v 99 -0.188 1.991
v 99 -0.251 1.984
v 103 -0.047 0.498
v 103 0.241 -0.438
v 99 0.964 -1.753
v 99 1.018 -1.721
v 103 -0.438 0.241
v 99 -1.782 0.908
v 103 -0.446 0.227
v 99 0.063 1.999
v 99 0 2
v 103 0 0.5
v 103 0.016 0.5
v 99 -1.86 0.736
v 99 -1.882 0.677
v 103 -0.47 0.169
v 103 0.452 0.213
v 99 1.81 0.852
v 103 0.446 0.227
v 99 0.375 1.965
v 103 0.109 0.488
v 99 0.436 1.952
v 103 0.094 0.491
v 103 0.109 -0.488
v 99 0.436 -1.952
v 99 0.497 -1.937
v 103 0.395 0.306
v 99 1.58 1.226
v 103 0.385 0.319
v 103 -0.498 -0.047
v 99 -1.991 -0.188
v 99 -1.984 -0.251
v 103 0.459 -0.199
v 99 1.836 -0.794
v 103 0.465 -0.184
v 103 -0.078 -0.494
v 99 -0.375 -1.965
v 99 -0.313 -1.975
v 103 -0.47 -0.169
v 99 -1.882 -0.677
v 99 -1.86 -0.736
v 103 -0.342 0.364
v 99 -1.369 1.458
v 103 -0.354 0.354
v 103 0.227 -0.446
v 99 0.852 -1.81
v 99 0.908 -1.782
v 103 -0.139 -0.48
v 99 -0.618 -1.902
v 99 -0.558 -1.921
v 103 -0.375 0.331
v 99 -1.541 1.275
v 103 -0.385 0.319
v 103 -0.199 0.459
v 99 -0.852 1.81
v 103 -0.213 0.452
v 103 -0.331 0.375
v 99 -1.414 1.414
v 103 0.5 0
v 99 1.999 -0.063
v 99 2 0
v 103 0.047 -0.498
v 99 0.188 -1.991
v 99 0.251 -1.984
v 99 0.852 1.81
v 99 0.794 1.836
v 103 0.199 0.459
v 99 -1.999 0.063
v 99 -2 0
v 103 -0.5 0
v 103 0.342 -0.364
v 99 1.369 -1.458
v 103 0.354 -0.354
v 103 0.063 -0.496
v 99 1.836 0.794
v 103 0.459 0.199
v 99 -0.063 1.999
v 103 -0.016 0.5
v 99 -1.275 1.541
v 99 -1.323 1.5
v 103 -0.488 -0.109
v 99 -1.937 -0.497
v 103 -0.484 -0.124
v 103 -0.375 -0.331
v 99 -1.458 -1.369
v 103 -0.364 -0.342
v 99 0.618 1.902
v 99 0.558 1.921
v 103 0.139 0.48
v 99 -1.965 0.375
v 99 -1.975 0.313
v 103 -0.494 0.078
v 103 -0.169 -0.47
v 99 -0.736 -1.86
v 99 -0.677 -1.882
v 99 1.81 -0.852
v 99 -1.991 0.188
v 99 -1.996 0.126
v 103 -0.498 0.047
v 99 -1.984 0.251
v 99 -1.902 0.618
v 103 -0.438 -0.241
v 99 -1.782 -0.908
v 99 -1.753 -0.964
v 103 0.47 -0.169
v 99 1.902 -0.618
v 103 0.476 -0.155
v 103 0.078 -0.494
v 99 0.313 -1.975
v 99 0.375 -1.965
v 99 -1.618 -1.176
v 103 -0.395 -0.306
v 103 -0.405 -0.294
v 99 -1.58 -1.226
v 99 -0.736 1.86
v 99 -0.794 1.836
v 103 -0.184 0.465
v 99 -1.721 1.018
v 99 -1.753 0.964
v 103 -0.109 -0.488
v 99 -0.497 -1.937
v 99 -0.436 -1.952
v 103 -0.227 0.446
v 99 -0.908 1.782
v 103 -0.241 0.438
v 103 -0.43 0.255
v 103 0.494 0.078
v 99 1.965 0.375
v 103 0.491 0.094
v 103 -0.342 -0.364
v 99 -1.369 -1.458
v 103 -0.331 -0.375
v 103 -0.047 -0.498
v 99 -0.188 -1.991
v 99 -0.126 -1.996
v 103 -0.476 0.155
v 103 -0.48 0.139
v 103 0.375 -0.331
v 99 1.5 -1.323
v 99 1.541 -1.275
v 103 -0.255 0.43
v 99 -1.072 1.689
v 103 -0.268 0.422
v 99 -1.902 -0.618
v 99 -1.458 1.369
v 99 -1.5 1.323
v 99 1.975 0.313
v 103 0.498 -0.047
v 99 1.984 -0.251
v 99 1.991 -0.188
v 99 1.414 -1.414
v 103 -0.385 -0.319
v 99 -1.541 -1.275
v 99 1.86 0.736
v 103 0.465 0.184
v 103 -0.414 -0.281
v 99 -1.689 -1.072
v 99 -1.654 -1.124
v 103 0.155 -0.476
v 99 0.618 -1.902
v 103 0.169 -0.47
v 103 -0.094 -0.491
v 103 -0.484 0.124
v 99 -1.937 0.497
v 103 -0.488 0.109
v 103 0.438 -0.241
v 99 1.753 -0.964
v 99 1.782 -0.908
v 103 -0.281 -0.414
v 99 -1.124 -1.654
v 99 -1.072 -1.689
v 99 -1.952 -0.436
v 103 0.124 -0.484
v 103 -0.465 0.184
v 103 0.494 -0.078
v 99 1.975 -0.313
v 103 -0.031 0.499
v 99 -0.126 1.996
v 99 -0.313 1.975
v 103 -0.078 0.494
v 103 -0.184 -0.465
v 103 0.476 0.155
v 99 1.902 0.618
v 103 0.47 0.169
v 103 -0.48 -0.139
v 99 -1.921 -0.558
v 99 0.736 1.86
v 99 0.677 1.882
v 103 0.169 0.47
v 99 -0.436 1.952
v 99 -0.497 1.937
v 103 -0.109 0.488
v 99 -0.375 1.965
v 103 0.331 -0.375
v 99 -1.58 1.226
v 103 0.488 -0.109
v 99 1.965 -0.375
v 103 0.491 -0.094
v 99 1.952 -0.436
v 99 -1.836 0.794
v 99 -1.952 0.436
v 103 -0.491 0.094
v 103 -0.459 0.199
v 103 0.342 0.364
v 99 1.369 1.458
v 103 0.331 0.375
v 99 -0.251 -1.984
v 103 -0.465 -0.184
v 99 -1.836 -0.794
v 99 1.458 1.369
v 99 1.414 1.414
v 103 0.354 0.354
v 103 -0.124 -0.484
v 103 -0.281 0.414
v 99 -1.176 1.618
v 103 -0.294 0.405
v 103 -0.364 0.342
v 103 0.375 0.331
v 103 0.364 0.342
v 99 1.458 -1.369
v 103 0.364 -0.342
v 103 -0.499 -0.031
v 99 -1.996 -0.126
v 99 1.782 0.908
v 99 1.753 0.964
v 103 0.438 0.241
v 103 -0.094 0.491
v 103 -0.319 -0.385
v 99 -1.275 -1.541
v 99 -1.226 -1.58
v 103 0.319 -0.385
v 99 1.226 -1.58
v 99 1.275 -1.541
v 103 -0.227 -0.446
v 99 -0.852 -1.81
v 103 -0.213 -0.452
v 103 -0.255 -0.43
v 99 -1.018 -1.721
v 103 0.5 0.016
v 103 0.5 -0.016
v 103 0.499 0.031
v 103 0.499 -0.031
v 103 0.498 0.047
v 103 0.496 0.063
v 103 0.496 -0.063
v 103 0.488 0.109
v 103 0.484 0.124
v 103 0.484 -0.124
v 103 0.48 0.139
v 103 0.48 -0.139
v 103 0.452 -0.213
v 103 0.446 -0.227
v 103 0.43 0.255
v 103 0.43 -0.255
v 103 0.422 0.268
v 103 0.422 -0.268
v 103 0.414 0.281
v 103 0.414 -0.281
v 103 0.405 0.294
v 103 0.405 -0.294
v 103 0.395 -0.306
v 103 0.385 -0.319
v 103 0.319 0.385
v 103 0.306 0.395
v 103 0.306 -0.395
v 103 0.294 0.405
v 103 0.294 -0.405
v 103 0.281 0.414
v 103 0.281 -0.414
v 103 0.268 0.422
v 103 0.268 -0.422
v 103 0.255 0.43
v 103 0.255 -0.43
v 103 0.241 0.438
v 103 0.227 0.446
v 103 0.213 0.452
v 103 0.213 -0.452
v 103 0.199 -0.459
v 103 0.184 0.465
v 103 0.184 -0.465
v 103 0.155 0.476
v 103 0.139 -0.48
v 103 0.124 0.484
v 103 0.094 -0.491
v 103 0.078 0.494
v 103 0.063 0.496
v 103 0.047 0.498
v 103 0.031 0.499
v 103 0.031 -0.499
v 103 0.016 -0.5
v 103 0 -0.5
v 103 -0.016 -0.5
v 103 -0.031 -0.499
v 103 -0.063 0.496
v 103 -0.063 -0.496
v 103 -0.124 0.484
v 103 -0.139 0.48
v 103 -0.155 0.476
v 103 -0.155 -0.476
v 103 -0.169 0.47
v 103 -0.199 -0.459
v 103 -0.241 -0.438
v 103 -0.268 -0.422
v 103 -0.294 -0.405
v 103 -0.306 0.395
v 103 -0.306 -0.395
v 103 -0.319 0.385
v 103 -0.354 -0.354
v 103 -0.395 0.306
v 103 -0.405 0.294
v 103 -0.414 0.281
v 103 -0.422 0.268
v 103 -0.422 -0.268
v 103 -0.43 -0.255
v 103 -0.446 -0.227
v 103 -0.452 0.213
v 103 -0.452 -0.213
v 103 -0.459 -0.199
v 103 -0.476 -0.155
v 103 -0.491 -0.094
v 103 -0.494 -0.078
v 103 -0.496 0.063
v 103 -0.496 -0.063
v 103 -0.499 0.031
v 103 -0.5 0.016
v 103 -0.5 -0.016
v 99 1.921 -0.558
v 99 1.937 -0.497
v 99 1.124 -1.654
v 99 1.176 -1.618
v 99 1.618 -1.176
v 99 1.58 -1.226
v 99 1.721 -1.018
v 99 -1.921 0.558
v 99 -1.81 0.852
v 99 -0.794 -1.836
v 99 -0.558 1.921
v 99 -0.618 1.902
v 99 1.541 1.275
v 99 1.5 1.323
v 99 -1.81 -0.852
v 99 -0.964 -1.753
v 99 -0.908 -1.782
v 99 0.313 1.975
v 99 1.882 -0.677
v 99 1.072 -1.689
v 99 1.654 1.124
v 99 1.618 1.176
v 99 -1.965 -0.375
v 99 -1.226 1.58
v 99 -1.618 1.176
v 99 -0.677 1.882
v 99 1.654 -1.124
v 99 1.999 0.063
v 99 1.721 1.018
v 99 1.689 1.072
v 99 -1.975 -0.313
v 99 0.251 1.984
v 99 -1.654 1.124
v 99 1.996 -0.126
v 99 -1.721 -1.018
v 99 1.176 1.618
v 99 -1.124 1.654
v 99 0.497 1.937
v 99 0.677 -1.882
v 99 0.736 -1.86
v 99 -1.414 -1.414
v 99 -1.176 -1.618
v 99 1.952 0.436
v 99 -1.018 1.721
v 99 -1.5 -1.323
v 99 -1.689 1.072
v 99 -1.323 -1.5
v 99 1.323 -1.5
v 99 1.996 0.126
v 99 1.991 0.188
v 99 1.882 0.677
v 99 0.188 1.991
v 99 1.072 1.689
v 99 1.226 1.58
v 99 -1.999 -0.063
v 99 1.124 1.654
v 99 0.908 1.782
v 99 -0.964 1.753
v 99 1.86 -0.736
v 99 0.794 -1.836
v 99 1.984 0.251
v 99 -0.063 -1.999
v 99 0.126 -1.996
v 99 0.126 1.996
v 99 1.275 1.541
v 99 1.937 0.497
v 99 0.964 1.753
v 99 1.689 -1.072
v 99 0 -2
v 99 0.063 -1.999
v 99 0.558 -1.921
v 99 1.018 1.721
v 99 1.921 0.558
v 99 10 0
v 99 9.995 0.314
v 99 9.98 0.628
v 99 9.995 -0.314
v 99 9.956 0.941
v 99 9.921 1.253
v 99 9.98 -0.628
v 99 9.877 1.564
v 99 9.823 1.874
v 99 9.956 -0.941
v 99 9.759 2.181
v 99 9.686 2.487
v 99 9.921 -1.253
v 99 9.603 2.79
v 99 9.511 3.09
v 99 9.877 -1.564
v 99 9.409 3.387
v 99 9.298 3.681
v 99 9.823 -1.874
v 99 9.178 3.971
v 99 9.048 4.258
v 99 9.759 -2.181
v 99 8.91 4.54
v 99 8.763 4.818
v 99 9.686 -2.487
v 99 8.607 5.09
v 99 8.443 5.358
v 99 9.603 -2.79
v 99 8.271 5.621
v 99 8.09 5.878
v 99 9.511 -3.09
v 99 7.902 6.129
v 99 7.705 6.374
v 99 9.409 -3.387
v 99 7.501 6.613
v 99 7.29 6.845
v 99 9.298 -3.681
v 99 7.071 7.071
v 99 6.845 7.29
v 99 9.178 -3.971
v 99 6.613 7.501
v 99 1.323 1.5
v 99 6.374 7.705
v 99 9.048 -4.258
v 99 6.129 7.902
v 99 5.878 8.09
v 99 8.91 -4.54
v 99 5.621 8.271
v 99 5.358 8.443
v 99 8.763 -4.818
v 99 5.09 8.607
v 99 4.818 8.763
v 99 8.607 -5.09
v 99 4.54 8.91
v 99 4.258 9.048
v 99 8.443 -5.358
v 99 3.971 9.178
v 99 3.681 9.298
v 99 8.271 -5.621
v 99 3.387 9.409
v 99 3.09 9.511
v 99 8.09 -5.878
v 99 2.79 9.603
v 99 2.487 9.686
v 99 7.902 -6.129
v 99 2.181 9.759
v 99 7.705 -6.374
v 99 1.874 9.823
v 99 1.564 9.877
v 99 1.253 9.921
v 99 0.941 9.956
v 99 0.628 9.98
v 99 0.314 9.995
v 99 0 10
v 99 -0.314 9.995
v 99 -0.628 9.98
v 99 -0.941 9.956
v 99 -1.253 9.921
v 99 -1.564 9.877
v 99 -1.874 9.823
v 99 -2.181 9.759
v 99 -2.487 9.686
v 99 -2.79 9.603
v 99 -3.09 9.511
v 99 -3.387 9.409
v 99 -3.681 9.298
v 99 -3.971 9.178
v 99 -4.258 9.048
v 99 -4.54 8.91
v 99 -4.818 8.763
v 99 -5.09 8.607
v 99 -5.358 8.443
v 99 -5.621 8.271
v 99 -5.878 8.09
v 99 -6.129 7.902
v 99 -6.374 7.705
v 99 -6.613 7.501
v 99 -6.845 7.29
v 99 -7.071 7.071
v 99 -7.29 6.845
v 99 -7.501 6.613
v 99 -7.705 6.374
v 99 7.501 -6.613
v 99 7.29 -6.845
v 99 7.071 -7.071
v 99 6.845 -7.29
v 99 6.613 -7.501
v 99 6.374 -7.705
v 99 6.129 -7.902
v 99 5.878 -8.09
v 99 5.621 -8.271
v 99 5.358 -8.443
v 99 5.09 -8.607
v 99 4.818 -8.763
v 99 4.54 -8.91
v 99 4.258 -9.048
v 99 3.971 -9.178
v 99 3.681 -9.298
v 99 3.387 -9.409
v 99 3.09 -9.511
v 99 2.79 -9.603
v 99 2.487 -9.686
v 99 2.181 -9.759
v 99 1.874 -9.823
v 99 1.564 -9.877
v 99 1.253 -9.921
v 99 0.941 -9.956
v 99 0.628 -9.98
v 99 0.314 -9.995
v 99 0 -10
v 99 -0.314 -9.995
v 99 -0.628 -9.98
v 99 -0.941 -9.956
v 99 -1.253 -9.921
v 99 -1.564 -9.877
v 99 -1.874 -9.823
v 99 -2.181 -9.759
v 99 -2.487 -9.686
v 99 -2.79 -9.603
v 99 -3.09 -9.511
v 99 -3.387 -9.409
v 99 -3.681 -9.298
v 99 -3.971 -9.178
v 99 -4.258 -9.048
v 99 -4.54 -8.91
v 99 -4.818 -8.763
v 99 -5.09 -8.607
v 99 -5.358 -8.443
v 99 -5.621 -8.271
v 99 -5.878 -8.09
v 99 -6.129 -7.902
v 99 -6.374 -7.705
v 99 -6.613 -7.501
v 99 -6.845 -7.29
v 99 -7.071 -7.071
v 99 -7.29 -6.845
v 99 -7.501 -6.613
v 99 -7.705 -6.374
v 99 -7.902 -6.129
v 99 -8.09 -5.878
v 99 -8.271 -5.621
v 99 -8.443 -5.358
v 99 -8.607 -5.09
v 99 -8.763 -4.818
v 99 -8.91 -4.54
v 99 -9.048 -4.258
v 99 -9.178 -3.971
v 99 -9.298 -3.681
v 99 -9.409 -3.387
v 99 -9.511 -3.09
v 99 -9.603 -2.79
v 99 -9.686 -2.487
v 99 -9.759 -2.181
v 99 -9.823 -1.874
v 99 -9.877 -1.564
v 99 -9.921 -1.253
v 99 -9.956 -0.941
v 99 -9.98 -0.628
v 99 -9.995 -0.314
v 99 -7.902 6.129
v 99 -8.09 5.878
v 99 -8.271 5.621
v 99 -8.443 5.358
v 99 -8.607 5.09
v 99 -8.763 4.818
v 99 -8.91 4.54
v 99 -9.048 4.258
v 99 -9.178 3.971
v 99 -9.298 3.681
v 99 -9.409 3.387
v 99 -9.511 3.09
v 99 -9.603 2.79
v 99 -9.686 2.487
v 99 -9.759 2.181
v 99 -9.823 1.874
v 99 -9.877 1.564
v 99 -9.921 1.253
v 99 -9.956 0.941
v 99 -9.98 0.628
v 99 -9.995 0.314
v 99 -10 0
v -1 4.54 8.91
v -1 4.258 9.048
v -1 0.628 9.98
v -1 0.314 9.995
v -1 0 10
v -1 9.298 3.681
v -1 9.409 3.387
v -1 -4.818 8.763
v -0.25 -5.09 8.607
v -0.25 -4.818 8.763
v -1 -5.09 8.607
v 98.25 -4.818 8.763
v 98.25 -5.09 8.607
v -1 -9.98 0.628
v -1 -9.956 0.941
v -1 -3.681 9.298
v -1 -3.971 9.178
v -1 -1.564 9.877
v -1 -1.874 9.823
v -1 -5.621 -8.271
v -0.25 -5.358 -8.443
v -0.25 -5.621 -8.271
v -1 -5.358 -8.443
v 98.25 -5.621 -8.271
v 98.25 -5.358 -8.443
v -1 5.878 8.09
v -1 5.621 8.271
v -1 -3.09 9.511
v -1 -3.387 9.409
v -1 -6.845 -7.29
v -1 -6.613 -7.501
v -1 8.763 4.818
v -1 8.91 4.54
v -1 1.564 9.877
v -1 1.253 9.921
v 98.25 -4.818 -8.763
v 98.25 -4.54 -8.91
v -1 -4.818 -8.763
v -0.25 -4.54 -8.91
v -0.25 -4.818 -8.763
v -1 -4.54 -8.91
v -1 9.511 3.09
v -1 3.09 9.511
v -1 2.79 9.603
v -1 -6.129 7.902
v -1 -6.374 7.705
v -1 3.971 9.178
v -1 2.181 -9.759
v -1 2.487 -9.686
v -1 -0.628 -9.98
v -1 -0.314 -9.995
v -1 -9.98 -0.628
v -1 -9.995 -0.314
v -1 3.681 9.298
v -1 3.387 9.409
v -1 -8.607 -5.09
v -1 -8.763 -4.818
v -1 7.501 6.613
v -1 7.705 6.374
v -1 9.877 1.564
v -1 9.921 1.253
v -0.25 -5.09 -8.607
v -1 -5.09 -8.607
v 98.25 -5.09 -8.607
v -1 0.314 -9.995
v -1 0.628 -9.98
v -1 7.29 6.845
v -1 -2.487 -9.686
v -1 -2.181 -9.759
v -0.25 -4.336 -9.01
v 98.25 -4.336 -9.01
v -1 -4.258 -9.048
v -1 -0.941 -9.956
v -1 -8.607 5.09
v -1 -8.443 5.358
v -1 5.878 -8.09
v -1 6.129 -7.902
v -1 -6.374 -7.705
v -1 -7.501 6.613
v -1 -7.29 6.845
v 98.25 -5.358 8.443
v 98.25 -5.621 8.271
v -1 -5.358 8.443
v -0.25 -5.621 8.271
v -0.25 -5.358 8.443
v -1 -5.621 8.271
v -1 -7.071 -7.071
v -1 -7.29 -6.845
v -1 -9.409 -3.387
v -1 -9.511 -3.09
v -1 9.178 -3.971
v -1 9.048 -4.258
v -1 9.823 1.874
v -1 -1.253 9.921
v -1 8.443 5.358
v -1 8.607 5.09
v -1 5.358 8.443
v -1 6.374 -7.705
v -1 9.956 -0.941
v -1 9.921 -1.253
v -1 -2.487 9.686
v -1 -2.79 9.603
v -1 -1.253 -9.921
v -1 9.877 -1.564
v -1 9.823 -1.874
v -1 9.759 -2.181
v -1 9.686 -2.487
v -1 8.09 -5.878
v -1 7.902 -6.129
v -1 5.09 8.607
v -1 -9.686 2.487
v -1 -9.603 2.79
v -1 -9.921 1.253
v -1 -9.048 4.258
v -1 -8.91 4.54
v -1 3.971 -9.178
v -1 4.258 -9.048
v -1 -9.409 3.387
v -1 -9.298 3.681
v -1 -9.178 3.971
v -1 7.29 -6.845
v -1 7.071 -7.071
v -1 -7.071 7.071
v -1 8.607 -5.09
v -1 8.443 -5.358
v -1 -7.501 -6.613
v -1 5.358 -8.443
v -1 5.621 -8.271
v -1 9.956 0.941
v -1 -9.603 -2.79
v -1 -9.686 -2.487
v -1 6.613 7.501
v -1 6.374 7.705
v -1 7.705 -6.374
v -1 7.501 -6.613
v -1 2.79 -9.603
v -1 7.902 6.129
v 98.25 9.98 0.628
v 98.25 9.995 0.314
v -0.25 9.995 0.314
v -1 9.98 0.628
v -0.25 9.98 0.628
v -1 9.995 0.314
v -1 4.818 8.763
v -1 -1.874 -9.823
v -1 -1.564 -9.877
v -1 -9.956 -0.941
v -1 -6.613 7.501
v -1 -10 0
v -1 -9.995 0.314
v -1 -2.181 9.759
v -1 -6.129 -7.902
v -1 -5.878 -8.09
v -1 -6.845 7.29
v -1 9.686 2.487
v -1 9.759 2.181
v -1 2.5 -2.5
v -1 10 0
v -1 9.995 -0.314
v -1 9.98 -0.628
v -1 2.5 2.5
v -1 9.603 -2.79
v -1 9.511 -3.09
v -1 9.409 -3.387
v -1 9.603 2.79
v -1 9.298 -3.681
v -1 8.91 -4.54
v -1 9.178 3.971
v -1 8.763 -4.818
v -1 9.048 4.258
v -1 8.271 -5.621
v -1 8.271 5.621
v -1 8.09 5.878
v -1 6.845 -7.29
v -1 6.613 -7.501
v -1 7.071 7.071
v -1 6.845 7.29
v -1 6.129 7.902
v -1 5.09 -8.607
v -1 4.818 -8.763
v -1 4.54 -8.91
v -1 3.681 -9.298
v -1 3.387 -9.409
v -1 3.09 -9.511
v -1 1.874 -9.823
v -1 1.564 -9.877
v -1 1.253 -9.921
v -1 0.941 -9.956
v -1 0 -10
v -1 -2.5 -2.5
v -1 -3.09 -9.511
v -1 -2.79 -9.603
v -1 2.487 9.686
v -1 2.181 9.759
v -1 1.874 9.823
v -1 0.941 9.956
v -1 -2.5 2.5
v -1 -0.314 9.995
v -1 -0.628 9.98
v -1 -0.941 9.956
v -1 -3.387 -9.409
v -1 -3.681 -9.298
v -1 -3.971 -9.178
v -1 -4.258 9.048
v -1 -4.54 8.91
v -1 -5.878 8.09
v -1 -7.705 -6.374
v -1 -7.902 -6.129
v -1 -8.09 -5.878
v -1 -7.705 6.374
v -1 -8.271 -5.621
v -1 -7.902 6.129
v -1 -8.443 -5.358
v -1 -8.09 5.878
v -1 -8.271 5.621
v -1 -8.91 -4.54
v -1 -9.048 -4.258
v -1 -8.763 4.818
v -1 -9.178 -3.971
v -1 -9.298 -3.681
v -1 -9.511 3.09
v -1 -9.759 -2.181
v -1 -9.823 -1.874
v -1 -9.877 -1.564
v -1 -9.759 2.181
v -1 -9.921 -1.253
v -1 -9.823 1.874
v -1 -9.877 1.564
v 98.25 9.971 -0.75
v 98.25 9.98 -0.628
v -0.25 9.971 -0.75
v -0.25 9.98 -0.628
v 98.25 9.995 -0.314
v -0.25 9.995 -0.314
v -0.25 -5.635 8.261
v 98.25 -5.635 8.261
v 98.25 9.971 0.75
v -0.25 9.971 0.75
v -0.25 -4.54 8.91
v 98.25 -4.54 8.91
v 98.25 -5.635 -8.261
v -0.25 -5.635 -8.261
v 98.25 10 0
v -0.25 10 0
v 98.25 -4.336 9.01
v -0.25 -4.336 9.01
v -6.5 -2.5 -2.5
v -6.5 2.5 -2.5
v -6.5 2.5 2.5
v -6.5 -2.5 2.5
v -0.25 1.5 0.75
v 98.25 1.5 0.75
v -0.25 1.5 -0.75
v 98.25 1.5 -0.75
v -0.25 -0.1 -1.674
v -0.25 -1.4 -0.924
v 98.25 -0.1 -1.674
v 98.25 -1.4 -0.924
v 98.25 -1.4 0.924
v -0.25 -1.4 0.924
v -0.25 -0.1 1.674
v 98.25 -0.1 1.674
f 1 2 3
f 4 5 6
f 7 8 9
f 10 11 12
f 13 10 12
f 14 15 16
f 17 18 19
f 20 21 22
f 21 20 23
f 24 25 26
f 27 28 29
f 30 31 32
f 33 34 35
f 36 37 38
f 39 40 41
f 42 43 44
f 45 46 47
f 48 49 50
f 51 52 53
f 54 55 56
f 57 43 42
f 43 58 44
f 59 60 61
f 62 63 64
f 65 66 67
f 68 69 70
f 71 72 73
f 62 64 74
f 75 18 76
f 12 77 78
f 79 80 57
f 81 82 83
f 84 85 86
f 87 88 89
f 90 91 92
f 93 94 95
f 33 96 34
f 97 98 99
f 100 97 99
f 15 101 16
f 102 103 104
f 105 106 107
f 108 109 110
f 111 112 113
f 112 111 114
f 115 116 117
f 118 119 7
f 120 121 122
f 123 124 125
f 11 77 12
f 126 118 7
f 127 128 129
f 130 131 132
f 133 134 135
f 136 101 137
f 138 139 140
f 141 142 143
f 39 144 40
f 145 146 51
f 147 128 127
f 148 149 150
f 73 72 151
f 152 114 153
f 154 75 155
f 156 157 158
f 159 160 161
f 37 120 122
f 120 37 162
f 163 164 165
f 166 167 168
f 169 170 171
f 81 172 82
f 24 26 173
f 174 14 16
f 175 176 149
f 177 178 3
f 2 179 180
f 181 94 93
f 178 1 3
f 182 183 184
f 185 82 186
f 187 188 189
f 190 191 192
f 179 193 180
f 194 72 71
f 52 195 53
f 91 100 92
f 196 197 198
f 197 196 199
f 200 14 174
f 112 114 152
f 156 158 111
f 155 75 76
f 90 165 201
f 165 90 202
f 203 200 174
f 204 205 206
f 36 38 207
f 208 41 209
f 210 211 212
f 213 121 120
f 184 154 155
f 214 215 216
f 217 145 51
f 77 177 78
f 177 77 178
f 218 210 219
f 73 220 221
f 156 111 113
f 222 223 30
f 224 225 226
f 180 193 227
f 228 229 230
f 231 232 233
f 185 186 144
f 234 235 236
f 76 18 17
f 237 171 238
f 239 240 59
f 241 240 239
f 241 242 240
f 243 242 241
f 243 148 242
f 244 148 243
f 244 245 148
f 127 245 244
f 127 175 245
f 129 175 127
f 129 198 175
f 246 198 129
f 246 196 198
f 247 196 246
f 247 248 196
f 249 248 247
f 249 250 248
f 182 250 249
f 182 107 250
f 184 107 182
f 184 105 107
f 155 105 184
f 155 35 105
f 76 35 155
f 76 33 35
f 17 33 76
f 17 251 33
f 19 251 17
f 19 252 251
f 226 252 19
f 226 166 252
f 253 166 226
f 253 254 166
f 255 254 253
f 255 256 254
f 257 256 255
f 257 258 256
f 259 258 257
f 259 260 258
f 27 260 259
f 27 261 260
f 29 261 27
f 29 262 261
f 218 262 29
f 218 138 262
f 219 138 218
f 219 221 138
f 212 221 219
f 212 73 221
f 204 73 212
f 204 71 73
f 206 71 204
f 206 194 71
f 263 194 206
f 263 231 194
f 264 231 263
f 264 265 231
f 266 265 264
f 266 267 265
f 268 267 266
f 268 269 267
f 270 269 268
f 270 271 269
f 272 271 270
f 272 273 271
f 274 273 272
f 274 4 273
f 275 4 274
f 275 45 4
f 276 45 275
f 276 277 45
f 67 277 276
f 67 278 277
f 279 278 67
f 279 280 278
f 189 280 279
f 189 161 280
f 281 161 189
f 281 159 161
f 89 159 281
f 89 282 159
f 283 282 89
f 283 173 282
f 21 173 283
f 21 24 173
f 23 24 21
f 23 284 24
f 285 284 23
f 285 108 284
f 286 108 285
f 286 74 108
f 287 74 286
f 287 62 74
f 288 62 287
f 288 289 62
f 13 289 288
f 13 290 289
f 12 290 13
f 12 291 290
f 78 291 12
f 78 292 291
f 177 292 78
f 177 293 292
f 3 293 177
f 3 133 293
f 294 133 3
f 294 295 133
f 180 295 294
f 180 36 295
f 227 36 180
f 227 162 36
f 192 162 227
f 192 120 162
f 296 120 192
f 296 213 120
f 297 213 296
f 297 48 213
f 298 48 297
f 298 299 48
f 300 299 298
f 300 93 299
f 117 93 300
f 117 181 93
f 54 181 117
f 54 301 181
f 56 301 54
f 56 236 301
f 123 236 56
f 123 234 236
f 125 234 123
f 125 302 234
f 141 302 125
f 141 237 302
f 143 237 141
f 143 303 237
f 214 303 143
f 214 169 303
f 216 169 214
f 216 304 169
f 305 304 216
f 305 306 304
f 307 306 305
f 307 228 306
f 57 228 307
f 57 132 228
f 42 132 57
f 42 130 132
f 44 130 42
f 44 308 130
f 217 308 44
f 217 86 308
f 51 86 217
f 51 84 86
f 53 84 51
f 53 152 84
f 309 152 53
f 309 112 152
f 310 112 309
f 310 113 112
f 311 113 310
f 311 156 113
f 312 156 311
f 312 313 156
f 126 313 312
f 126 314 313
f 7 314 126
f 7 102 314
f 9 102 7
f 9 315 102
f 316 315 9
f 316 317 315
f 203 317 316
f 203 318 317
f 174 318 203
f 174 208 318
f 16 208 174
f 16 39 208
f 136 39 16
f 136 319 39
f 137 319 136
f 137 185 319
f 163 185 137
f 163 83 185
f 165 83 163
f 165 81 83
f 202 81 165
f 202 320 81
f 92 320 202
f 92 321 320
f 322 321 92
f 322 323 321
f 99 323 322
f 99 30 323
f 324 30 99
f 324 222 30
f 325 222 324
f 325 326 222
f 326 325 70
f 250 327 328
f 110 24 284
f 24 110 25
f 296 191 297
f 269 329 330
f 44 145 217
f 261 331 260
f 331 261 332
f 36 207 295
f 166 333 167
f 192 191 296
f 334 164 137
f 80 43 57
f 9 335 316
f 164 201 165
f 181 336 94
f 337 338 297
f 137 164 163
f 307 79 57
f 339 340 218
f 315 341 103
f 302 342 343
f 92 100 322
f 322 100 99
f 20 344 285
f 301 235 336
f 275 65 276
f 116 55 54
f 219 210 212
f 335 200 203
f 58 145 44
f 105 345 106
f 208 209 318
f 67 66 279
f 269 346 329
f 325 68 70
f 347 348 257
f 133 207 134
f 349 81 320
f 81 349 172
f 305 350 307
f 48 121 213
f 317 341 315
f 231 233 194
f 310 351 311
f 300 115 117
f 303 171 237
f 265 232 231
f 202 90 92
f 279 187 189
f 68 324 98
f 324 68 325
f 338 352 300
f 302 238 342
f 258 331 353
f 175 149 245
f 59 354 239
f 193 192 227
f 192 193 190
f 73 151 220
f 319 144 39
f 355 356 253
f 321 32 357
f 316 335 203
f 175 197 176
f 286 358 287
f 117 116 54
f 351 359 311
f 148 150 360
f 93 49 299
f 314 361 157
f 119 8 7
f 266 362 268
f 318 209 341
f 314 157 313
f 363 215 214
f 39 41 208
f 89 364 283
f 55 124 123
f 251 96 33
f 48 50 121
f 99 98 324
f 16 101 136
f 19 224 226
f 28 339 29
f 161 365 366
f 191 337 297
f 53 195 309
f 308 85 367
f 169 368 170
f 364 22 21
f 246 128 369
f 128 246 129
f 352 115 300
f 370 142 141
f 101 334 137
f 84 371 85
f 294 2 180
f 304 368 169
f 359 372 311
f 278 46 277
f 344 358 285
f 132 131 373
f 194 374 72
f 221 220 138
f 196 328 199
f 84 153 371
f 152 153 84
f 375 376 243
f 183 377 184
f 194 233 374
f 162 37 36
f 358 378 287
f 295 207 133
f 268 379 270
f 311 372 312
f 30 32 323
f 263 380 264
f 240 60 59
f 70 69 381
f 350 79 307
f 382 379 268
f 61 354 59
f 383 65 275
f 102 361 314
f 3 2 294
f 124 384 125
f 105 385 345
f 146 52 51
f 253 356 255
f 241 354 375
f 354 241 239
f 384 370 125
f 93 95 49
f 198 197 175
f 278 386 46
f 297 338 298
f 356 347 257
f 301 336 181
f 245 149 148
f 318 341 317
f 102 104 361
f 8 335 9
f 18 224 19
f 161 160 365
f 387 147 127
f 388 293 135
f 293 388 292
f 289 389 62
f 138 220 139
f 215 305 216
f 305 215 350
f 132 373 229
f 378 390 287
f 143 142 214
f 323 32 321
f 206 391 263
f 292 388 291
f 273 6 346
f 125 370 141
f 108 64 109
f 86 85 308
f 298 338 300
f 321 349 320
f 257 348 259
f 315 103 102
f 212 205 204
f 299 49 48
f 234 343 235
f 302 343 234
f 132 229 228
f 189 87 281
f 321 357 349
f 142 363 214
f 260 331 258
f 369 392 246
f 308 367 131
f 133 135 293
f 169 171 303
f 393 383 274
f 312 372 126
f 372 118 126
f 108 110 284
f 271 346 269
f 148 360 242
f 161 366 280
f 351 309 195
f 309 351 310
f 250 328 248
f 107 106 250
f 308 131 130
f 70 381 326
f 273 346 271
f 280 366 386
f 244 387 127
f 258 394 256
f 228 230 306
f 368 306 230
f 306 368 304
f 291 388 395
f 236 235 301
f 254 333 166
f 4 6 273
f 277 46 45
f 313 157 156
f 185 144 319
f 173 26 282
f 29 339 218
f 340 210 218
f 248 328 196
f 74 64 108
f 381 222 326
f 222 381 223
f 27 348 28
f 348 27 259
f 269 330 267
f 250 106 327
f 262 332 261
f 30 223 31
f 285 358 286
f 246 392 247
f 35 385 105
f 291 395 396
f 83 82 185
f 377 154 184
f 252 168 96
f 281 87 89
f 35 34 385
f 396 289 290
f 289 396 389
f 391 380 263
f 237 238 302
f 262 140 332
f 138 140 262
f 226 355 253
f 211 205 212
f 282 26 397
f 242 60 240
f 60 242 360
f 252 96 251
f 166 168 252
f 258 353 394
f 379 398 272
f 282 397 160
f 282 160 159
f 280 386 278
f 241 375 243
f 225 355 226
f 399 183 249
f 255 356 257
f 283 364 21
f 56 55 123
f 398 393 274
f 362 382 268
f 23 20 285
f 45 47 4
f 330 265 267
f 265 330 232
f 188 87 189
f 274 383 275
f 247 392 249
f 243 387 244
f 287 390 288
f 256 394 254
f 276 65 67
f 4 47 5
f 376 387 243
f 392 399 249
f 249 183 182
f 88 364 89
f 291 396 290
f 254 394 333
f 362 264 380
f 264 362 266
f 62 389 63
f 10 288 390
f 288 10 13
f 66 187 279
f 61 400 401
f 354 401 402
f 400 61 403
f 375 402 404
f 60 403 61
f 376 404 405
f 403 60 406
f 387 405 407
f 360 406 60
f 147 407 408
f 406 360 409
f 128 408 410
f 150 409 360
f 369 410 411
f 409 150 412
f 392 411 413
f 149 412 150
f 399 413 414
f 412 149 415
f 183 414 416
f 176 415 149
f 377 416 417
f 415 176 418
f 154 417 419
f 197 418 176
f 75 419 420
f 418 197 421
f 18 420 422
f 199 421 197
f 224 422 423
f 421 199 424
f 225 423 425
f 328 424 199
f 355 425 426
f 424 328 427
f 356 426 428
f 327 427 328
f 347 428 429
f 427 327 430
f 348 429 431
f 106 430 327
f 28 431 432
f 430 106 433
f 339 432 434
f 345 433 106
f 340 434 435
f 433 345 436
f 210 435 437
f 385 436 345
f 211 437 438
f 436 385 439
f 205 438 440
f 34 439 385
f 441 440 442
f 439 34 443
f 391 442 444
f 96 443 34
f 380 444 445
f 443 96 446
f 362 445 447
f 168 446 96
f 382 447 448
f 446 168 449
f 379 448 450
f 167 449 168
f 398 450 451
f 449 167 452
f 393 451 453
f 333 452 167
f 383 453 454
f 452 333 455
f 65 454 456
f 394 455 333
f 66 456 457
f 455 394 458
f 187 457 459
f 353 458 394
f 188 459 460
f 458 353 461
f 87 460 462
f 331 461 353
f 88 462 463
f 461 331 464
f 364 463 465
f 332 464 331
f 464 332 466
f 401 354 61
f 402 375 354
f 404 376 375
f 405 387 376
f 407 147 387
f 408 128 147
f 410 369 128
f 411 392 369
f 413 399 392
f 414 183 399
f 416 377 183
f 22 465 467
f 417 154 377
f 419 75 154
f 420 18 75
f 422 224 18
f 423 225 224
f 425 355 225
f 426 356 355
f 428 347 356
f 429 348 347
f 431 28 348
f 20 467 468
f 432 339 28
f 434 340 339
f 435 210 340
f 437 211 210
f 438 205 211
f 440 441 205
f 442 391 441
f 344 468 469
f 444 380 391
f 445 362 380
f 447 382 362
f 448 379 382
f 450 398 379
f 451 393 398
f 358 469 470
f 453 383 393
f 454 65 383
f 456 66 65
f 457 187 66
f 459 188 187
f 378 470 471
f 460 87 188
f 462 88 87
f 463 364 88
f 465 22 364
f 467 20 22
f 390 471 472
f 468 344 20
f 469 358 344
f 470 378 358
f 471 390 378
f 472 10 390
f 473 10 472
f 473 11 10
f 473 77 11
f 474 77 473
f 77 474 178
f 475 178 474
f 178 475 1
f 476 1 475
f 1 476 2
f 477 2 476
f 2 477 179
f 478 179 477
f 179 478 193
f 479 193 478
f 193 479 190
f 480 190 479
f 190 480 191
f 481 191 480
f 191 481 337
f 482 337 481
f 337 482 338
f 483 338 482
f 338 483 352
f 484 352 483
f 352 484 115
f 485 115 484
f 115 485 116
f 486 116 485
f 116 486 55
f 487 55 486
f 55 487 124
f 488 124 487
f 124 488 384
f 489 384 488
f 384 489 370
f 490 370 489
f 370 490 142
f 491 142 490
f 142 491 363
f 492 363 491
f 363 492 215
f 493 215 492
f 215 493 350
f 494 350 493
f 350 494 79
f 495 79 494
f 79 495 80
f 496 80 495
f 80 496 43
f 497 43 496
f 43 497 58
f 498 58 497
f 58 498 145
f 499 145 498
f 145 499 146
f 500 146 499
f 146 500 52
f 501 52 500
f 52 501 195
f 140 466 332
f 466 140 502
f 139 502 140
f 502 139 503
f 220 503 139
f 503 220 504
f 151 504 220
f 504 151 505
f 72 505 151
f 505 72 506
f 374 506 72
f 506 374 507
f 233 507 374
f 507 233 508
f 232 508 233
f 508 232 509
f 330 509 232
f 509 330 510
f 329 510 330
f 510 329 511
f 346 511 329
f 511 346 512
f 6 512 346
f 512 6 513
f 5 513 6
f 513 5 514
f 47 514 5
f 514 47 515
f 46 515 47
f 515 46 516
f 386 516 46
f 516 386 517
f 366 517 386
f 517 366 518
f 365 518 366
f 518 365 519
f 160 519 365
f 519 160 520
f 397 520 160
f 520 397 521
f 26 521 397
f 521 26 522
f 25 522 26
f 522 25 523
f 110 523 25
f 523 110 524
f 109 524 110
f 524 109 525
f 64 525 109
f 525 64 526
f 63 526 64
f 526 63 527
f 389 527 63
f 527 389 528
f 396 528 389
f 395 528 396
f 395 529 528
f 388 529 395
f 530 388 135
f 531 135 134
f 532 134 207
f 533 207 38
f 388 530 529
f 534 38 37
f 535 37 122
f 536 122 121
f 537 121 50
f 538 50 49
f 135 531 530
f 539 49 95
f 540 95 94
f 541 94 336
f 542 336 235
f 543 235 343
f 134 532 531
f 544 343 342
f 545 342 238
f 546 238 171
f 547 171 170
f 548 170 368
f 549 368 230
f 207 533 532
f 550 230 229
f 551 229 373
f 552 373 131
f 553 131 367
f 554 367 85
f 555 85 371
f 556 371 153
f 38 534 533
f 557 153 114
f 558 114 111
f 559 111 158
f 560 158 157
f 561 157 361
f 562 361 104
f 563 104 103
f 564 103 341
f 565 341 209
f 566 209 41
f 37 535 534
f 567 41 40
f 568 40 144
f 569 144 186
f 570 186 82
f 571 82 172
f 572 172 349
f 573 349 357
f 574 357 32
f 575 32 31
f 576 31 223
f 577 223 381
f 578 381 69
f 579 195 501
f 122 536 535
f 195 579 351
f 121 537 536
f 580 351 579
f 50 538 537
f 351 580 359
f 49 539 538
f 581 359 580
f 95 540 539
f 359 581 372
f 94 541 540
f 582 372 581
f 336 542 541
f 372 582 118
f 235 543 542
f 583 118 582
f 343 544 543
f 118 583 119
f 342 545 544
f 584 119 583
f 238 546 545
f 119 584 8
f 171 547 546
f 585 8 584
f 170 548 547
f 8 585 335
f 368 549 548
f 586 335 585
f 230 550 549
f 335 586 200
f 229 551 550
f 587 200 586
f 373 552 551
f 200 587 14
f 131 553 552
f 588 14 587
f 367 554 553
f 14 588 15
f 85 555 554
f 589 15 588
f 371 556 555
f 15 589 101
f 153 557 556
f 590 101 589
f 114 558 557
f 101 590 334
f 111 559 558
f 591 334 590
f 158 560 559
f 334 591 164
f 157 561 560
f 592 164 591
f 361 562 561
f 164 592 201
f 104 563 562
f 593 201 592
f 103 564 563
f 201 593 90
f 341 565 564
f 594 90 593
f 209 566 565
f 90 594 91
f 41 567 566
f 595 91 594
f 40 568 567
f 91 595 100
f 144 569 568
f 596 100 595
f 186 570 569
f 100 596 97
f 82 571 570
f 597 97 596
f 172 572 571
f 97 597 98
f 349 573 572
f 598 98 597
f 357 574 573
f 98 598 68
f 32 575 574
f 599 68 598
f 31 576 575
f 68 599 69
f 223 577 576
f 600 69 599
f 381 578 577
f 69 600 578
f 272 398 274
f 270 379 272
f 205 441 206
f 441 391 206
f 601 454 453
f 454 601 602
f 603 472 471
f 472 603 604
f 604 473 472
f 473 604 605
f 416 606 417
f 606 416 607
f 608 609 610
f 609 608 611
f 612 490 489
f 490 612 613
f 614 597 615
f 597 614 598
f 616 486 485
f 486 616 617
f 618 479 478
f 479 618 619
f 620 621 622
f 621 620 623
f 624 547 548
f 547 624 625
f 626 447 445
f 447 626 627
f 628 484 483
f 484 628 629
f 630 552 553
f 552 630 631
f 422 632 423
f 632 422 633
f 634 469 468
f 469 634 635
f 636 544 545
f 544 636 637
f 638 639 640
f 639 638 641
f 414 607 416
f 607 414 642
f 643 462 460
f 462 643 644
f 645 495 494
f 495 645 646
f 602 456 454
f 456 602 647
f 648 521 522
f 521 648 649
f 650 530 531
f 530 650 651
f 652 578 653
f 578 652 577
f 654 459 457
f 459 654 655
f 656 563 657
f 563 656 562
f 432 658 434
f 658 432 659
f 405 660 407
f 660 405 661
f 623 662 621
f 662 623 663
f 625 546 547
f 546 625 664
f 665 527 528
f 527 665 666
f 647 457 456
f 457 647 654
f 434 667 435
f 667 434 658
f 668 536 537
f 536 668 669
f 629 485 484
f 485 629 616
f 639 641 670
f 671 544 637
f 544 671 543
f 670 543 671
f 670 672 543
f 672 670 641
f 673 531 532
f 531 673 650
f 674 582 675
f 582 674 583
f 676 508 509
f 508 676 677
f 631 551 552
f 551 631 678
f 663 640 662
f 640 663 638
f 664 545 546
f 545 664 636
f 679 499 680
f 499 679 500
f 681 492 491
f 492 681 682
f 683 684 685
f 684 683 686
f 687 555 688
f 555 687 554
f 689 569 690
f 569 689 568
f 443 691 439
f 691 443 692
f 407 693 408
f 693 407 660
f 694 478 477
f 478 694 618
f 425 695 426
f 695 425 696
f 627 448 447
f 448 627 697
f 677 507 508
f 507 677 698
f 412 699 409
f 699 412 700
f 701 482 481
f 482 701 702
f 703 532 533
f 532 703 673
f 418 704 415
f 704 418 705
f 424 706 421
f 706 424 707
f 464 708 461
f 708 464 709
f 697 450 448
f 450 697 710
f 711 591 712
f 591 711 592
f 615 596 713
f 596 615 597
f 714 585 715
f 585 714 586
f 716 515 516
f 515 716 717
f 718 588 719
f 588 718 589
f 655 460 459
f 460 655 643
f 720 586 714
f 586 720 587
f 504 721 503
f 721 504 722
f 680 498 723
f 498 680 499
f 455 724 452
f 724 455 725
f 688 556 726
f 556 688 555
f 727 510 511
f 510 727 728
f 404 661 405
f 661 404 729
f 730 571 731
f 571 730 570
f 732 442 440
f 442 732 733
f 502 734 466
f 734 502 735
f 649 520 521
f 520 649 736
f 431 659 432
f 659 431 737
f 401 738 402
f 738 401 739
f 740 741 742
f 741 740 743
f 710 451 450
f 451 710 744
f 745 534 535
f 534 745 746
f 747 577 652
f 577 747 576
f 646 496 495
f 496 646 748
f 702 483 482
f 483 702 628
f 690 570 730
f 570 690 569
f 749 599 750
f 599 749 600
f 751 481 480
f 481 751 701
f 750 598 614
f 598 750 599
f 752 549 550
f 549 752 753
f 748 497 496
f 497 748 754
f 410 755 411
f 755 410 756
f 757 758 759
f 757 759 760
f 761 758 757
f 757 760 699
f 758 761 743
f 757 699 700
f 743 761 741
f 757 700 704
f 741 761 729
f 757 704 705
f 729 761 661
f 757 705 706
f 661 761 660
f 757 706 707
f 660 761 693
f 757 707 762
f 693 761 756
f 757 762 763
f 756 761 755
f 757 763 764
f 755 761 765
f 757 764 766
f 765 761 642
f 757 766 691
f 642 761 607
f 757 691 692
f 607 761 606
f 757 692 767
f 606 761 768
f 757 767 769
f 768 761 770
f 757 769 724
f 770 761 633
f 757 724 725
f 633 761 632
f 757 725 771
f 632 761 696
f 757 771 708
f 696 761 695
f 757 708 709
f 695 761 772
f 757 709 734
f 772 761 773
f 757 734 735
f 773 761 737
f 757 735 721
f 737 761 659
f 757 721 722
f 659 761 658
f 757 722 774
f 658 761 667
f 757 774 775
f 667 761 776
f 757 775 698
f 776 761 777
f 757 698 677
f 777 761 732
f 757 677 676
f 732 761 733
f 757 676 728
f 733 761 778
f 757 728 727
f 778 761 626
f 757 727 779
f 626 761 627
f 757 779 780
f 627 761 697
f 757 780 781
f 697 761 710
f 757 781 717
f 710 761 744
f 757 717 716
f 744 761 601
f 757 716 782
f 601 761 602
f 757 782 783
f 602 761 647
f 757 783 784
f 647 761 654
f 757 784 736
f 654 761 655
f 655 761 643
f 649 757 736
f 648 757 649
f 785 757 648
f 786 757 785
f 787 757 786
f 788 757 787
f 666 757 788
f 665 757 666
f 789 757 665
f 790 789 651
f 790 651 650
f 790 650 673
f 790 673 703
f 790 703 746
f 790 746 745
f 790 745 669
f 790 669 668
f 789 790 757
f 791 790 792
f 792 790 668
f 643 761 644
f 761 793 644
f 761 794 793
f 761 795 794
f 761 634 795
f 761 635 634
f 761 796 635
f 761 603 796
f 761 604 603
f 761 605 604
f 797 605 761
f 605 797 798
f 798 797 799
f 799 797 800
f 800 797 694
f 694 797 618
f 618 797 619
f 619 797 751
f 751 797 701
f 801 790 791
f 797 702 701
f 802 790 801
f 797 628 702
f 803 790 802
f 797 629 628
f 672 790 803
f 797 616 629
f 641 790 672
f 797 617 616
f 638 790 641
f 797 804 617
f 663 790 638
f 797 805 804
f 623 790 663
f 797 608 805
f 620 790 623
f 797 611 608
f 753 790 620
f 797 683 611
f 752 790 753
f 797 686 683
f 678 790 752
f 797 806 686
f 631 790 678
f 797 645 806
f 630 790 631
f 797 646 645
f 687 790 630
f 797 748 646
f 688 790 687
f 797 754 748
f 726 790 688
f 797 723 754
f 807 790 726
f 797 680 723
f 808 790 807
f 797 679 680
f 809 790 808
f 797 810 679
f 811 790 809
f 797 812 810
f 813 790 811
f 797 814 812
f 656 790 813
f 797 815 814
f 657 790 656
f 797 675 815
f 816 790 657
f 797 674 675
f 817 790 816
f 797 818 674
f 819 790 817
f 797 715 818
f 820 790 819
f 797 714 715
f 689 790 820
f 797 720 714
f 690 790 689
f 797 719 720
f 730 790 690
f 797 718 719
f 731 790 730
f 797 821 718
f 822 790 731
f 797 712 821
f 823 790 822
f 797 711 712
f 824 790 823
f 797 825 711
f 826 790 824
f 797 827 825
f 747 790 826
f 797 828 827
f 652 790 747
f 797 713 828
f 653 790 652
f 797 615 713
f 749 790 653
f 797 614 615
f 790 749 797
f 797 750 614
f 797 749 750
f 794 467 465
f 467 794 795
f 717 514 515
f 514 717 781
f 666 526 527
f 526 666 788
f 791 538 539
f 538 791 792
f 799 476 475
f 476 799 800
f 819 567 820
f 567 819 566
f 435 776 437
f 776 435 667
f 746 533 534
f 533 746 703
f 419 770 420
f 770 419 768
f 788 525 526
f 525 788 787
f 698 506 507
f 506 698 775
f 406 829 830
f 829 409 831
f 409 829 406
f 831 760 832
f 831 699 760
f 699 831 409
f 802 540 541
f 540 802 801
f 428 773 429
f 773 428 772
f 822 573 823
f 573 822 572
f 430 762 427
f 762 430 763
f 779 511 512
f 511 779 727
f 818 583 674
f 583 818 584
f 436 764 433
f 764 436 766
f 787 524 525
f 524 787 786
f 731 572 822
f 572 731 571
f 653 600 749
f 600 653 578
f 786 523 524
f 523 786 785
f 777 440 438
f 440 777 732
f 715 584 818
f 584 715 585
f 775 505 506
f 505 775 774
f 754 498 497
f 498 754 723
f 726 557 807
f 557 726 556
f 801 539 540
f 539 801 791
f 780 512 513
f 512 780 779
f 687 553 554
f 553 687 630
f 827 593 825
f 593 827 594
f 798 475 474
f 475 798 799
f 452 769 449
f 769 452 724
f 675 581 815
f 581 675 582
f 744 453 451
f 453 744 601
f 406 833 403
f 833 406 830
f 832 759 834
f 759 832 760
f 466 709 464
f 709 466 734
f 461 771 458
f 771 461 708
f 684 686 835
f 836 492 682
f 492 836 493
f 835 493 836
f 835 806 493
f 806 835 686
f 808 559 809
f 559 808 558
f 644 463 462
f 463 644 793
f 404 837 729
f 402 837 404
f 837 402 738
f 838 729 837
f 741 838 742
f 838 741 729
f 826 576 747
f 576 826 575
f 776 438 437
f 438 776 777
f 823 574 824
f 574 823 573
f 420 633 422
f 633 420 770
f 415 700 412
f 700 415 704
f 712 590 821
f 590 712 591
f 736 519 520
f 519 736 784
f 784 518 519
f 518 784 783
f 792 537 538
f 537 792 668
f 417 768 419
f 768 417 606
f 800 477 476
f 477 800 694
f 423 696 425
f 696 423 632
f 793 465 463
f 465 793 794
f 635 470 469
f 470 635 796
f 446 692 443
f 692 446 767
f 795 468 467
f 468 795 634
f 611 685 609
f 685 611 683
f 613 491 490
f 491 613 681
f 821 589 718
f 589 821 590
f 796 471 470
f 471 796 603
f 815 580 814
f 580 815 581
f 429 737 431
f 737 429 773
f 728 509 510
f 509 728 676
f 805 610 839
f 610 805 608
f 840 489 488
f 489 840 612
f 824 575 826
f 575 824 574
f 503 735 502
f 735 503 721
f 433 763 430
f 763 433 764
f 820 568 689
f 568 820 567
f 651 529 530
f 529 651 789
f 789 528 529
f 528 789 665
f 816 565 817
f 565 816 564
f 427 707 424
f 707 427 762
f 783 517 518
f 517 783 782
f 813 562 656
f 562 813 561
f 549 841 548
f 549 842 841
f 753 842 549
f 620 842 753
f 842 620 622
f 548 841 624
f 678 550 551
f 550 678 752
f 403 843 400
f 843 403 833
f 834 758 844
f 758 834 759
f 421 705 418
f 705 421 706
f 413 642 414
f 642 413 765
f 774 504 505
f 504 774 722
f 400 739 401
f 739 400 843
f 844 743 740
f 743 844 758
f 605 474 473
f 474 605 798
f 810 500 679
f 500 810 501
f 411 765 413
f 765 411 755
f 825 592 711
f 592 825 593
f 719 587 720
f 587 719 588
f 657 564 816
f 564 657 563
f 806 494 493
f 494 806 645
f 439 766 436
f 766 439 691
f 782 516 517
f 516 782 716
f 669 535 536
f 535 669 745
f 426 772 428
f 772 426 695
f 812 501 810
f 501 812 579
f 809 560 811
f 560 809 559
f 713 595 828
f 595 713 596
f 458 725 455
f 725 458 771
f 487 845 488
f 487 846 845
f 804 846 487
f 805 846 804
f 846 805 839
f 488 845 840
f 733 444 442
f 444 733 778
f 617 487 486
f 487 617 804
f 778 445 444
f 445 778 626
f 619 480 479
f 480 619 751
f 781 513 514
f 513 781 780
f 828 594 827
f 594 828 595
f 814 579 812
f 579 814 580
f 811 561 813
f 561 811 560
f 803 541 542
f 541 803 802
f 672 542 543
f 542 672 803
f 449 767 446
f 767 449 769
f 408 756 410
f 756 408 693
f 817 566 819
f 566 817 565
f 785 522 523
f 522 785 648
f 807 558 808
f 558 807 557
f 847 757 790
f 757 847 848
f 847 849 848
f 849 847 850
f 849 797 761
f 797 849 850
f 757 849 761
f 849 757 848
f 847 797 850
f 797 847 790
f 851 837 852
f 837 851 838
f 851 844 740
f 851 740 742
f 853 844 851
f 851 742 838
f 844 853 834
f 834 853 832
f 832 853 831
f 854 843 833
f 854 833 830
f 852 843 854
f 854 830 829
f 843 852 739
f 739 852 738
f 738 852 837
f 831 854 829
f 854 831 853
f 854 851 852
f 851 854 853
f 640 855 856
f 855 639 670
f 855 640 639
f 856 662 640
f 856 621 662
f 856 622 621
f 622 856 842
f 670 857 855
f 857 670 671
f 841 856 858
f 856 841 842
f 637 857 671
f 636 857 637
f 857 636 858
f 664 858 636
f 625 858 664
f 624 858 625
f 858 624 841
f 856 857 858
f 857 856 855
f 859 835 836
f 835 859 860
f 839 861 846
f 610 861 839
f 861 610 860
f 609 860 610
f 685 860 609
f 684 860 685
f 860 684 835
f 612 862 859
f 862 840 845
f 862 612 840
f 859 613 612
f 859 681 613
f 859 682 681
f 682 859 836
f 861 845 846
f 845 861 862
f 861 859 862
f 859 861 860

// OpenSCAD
// Generated by SolidPython 1.1.3 on 2022-07-08 02:15:18
$fn=200;


difference(){
	union() {
		translate(v = [101.0000000000, 0, 0]) {
			rotate(a = [0, -90, 0]) {
				union() {
					cylinder(center = true, h = 4.0000000000, r1 = 0.5000000000, r2 = 2.0000000000);
					translate(v = [0, 0, 52.0000000000]) {
						difference() {
							cylinder(center = true, h = 100.0000000000, r = 10.0000000000);
						}
					}
				}
			}
		}
		translate(v = [-2.5000000000, 0, 0]) {
			rotate(a = [0, 90, 0]) {
				cube(center = true, size = [5.0000000000, 5.0000000000, 8.0000000000]);
			}
		}
	}
	/* Holes Below*/
	union(){
		translate(v = [101.0000000000, 0, 0]){
			rotate(a = [0, -90, 0]){
				union(){
					translate(v = [0, 0, 52.0000000000]){
						union(){
							rotate(a = [0, 0, 0.0000000000]) {
								translate(v = [0, 5.7500000000, 0]) {
									cube(center = true, size = [1.5000000000, 8.5000000000, 98.5000000000]);
								}
							}
							rotate(a = [0, 0, 120.0000000000]) {
								translate(v = [0, 5.7500000000, 0]) {
									cube(center = true, size = [1.5000000000, 8.5000000000, 98.5000000000]);
								}
							}
							rotate(a = [0, 0, 240.0000000000]) {
								translate(v = [0, 5.7500000000, 0]) {
									cube(center = true, size = [1.5000000000, 8.5000000000, 98.5000000000]);
								}
							}
						}
					}
				}
			}
		}
	} /* End Holes */ 
}
/***********************************************
*********      SolidPython code:      **********
************************************************
 
from solid import *
from solid.utils import *
from math import asin, atan, pi, cos, sin, sqrt, tan, acos
import toml
import os


'''
a roomba brush for inserting nylon fibers into and zip tying 
together to form a disposable roomba brush. get an old broom and place tape across then cut.
place a belt of fibers into the wedge segments on either side, insert each wedge segment into the brush and zip tie.
insert the belt of fibers into the roomba brush

TODO: snap on to remove the need for zip ties
TODO: Can insert razors 
to chop hair that gets wound around the brush.
'''
def RoombaBrush(
    motor_insert_cube_profile,
    motor_insert_cube_length,
    stator_insert_cube_profile,
    stator_insert_cube_length,
    brush_length,
    brush_diameter,
    number_fins,
    fiber_diameter,
    wall_thickness,
):
    roomba_brush = None
    # create the cube for the stator side insert
    # TODO: frustrum cone instead as a bushing
    # stator_insert = cube(
    #     [stator_insert_cube_profile, stator_insert_cube_profile, stator_insert_cube_length], center=True)
    stator_insert = cylinder(
        r1=stator_insert_cube_profile-wall_thickness,
        r2=stator_insert_cube_profile,
        h=stator_insert_cube_length,
        center=True,
    )

    # create the cube for the motor side insert
    motor_insert = cube(
        [motor_insert_cube_profile, motor_insert_cube_profile, motor_insert_cube_length], center=True)

    # create a flange with inserts for each segment of the cylinder brush and attach to motor_insert and stator_insert
    flange = cylinder(
        r=brush_diameter, h=brush_length, center=True)
    # create guides for the fins as wall_thickness cubes 
    fin_guide = cube(
        [wall_thickness, brush_diameter-wall_thickness, brush_length-wall_thickness], center=True)
    fin_guide = translate([0, brush_diameter/2+wall_thickness/2, 0])(fin_guide)


    # calculate the degrees of rotation for each fin
    fin_rotation = 360 / number_fins
    # insert the fins atop the flange
    for i in range(number_fins):
        fin = rotate([0, 0, fin_rotation * i])(fin_guide)
        flange = flange-hole()(fin)
        # flange=flange+fin

    # place the flange on motor and stator inserts
    stator_insert = stator_insert + translate([0, 0, brush_length/2+stator_insert_cube_length/2])(flange)
    motor_insert = motor_insert 
    # rotate the inserts to be parallel to the x-axis
    stator_insert = rotate([0, -90, 0])(stator_insert)
    motor_insert = rotate([0, 90, 0])(motor_insert)
    
    # move the stator to the far side of the brush
    stator_insert = translate([brush_length+stator_insert_cube_profile/2,0,0])(stator_insert)
    # move the motor back to the yz plane
    motor_insert = translate([-motor_insert_cube_profile/2,0,0])(motor_insert)
    # get the degrees due to wall_thickness chord at brush_diameter
    chord_degrees = 360*wall_thickness/(pi*brush_diameter)

    # create a wedge for each segment of the brush that starts as arclength and ends as fiber_diameter
    # stuff fibers on either side and affix with glue or tape, this is temporary as zip ties will 
    # squeeze them against the barrell
    wedge= cube(
        [wall_thickness-2*fiber_diameter, brush_diameter-wall_thickness, brush_length-wall_thickness], center=True)
    wedge= translate([0,brush_diameter/2,0])(wedge)

    for i in range(number_fins):
        wedge = wedge + rotate([0, 0, fin_rotation * i])(wedge)

    wedge = rotate([0, 90, 0])(wedge)

    roomba_brush = stator_insert + motor_insert

    return roomba_brush, wedge 


def render_object(render_object, filename):
    """
    creates a .stl and .scad solution for the given solidpython OpenSCAD object
    PARAMETERS:
        render_object: the OpenSCAD object
        filename: a string for the file to be saved
    """
    scad_render_to_file(render_object, filename + ".scad", file_header="$fn=200;")
    # render with OpenSCAD
    print("Openscad is now rendering the solution..")
    os.system("openscad -o " + filename + ".stl " + filename + ".scad &")


if __name__ == "__main__":
    config = toml.load("configuration.toml")
    roomba_brush,wedge = RoombaBrush(**config)
    render_object(roomba_brush, "roomba_brush")
    render_object(wedge, "wedge")
 
 
************************************************/
